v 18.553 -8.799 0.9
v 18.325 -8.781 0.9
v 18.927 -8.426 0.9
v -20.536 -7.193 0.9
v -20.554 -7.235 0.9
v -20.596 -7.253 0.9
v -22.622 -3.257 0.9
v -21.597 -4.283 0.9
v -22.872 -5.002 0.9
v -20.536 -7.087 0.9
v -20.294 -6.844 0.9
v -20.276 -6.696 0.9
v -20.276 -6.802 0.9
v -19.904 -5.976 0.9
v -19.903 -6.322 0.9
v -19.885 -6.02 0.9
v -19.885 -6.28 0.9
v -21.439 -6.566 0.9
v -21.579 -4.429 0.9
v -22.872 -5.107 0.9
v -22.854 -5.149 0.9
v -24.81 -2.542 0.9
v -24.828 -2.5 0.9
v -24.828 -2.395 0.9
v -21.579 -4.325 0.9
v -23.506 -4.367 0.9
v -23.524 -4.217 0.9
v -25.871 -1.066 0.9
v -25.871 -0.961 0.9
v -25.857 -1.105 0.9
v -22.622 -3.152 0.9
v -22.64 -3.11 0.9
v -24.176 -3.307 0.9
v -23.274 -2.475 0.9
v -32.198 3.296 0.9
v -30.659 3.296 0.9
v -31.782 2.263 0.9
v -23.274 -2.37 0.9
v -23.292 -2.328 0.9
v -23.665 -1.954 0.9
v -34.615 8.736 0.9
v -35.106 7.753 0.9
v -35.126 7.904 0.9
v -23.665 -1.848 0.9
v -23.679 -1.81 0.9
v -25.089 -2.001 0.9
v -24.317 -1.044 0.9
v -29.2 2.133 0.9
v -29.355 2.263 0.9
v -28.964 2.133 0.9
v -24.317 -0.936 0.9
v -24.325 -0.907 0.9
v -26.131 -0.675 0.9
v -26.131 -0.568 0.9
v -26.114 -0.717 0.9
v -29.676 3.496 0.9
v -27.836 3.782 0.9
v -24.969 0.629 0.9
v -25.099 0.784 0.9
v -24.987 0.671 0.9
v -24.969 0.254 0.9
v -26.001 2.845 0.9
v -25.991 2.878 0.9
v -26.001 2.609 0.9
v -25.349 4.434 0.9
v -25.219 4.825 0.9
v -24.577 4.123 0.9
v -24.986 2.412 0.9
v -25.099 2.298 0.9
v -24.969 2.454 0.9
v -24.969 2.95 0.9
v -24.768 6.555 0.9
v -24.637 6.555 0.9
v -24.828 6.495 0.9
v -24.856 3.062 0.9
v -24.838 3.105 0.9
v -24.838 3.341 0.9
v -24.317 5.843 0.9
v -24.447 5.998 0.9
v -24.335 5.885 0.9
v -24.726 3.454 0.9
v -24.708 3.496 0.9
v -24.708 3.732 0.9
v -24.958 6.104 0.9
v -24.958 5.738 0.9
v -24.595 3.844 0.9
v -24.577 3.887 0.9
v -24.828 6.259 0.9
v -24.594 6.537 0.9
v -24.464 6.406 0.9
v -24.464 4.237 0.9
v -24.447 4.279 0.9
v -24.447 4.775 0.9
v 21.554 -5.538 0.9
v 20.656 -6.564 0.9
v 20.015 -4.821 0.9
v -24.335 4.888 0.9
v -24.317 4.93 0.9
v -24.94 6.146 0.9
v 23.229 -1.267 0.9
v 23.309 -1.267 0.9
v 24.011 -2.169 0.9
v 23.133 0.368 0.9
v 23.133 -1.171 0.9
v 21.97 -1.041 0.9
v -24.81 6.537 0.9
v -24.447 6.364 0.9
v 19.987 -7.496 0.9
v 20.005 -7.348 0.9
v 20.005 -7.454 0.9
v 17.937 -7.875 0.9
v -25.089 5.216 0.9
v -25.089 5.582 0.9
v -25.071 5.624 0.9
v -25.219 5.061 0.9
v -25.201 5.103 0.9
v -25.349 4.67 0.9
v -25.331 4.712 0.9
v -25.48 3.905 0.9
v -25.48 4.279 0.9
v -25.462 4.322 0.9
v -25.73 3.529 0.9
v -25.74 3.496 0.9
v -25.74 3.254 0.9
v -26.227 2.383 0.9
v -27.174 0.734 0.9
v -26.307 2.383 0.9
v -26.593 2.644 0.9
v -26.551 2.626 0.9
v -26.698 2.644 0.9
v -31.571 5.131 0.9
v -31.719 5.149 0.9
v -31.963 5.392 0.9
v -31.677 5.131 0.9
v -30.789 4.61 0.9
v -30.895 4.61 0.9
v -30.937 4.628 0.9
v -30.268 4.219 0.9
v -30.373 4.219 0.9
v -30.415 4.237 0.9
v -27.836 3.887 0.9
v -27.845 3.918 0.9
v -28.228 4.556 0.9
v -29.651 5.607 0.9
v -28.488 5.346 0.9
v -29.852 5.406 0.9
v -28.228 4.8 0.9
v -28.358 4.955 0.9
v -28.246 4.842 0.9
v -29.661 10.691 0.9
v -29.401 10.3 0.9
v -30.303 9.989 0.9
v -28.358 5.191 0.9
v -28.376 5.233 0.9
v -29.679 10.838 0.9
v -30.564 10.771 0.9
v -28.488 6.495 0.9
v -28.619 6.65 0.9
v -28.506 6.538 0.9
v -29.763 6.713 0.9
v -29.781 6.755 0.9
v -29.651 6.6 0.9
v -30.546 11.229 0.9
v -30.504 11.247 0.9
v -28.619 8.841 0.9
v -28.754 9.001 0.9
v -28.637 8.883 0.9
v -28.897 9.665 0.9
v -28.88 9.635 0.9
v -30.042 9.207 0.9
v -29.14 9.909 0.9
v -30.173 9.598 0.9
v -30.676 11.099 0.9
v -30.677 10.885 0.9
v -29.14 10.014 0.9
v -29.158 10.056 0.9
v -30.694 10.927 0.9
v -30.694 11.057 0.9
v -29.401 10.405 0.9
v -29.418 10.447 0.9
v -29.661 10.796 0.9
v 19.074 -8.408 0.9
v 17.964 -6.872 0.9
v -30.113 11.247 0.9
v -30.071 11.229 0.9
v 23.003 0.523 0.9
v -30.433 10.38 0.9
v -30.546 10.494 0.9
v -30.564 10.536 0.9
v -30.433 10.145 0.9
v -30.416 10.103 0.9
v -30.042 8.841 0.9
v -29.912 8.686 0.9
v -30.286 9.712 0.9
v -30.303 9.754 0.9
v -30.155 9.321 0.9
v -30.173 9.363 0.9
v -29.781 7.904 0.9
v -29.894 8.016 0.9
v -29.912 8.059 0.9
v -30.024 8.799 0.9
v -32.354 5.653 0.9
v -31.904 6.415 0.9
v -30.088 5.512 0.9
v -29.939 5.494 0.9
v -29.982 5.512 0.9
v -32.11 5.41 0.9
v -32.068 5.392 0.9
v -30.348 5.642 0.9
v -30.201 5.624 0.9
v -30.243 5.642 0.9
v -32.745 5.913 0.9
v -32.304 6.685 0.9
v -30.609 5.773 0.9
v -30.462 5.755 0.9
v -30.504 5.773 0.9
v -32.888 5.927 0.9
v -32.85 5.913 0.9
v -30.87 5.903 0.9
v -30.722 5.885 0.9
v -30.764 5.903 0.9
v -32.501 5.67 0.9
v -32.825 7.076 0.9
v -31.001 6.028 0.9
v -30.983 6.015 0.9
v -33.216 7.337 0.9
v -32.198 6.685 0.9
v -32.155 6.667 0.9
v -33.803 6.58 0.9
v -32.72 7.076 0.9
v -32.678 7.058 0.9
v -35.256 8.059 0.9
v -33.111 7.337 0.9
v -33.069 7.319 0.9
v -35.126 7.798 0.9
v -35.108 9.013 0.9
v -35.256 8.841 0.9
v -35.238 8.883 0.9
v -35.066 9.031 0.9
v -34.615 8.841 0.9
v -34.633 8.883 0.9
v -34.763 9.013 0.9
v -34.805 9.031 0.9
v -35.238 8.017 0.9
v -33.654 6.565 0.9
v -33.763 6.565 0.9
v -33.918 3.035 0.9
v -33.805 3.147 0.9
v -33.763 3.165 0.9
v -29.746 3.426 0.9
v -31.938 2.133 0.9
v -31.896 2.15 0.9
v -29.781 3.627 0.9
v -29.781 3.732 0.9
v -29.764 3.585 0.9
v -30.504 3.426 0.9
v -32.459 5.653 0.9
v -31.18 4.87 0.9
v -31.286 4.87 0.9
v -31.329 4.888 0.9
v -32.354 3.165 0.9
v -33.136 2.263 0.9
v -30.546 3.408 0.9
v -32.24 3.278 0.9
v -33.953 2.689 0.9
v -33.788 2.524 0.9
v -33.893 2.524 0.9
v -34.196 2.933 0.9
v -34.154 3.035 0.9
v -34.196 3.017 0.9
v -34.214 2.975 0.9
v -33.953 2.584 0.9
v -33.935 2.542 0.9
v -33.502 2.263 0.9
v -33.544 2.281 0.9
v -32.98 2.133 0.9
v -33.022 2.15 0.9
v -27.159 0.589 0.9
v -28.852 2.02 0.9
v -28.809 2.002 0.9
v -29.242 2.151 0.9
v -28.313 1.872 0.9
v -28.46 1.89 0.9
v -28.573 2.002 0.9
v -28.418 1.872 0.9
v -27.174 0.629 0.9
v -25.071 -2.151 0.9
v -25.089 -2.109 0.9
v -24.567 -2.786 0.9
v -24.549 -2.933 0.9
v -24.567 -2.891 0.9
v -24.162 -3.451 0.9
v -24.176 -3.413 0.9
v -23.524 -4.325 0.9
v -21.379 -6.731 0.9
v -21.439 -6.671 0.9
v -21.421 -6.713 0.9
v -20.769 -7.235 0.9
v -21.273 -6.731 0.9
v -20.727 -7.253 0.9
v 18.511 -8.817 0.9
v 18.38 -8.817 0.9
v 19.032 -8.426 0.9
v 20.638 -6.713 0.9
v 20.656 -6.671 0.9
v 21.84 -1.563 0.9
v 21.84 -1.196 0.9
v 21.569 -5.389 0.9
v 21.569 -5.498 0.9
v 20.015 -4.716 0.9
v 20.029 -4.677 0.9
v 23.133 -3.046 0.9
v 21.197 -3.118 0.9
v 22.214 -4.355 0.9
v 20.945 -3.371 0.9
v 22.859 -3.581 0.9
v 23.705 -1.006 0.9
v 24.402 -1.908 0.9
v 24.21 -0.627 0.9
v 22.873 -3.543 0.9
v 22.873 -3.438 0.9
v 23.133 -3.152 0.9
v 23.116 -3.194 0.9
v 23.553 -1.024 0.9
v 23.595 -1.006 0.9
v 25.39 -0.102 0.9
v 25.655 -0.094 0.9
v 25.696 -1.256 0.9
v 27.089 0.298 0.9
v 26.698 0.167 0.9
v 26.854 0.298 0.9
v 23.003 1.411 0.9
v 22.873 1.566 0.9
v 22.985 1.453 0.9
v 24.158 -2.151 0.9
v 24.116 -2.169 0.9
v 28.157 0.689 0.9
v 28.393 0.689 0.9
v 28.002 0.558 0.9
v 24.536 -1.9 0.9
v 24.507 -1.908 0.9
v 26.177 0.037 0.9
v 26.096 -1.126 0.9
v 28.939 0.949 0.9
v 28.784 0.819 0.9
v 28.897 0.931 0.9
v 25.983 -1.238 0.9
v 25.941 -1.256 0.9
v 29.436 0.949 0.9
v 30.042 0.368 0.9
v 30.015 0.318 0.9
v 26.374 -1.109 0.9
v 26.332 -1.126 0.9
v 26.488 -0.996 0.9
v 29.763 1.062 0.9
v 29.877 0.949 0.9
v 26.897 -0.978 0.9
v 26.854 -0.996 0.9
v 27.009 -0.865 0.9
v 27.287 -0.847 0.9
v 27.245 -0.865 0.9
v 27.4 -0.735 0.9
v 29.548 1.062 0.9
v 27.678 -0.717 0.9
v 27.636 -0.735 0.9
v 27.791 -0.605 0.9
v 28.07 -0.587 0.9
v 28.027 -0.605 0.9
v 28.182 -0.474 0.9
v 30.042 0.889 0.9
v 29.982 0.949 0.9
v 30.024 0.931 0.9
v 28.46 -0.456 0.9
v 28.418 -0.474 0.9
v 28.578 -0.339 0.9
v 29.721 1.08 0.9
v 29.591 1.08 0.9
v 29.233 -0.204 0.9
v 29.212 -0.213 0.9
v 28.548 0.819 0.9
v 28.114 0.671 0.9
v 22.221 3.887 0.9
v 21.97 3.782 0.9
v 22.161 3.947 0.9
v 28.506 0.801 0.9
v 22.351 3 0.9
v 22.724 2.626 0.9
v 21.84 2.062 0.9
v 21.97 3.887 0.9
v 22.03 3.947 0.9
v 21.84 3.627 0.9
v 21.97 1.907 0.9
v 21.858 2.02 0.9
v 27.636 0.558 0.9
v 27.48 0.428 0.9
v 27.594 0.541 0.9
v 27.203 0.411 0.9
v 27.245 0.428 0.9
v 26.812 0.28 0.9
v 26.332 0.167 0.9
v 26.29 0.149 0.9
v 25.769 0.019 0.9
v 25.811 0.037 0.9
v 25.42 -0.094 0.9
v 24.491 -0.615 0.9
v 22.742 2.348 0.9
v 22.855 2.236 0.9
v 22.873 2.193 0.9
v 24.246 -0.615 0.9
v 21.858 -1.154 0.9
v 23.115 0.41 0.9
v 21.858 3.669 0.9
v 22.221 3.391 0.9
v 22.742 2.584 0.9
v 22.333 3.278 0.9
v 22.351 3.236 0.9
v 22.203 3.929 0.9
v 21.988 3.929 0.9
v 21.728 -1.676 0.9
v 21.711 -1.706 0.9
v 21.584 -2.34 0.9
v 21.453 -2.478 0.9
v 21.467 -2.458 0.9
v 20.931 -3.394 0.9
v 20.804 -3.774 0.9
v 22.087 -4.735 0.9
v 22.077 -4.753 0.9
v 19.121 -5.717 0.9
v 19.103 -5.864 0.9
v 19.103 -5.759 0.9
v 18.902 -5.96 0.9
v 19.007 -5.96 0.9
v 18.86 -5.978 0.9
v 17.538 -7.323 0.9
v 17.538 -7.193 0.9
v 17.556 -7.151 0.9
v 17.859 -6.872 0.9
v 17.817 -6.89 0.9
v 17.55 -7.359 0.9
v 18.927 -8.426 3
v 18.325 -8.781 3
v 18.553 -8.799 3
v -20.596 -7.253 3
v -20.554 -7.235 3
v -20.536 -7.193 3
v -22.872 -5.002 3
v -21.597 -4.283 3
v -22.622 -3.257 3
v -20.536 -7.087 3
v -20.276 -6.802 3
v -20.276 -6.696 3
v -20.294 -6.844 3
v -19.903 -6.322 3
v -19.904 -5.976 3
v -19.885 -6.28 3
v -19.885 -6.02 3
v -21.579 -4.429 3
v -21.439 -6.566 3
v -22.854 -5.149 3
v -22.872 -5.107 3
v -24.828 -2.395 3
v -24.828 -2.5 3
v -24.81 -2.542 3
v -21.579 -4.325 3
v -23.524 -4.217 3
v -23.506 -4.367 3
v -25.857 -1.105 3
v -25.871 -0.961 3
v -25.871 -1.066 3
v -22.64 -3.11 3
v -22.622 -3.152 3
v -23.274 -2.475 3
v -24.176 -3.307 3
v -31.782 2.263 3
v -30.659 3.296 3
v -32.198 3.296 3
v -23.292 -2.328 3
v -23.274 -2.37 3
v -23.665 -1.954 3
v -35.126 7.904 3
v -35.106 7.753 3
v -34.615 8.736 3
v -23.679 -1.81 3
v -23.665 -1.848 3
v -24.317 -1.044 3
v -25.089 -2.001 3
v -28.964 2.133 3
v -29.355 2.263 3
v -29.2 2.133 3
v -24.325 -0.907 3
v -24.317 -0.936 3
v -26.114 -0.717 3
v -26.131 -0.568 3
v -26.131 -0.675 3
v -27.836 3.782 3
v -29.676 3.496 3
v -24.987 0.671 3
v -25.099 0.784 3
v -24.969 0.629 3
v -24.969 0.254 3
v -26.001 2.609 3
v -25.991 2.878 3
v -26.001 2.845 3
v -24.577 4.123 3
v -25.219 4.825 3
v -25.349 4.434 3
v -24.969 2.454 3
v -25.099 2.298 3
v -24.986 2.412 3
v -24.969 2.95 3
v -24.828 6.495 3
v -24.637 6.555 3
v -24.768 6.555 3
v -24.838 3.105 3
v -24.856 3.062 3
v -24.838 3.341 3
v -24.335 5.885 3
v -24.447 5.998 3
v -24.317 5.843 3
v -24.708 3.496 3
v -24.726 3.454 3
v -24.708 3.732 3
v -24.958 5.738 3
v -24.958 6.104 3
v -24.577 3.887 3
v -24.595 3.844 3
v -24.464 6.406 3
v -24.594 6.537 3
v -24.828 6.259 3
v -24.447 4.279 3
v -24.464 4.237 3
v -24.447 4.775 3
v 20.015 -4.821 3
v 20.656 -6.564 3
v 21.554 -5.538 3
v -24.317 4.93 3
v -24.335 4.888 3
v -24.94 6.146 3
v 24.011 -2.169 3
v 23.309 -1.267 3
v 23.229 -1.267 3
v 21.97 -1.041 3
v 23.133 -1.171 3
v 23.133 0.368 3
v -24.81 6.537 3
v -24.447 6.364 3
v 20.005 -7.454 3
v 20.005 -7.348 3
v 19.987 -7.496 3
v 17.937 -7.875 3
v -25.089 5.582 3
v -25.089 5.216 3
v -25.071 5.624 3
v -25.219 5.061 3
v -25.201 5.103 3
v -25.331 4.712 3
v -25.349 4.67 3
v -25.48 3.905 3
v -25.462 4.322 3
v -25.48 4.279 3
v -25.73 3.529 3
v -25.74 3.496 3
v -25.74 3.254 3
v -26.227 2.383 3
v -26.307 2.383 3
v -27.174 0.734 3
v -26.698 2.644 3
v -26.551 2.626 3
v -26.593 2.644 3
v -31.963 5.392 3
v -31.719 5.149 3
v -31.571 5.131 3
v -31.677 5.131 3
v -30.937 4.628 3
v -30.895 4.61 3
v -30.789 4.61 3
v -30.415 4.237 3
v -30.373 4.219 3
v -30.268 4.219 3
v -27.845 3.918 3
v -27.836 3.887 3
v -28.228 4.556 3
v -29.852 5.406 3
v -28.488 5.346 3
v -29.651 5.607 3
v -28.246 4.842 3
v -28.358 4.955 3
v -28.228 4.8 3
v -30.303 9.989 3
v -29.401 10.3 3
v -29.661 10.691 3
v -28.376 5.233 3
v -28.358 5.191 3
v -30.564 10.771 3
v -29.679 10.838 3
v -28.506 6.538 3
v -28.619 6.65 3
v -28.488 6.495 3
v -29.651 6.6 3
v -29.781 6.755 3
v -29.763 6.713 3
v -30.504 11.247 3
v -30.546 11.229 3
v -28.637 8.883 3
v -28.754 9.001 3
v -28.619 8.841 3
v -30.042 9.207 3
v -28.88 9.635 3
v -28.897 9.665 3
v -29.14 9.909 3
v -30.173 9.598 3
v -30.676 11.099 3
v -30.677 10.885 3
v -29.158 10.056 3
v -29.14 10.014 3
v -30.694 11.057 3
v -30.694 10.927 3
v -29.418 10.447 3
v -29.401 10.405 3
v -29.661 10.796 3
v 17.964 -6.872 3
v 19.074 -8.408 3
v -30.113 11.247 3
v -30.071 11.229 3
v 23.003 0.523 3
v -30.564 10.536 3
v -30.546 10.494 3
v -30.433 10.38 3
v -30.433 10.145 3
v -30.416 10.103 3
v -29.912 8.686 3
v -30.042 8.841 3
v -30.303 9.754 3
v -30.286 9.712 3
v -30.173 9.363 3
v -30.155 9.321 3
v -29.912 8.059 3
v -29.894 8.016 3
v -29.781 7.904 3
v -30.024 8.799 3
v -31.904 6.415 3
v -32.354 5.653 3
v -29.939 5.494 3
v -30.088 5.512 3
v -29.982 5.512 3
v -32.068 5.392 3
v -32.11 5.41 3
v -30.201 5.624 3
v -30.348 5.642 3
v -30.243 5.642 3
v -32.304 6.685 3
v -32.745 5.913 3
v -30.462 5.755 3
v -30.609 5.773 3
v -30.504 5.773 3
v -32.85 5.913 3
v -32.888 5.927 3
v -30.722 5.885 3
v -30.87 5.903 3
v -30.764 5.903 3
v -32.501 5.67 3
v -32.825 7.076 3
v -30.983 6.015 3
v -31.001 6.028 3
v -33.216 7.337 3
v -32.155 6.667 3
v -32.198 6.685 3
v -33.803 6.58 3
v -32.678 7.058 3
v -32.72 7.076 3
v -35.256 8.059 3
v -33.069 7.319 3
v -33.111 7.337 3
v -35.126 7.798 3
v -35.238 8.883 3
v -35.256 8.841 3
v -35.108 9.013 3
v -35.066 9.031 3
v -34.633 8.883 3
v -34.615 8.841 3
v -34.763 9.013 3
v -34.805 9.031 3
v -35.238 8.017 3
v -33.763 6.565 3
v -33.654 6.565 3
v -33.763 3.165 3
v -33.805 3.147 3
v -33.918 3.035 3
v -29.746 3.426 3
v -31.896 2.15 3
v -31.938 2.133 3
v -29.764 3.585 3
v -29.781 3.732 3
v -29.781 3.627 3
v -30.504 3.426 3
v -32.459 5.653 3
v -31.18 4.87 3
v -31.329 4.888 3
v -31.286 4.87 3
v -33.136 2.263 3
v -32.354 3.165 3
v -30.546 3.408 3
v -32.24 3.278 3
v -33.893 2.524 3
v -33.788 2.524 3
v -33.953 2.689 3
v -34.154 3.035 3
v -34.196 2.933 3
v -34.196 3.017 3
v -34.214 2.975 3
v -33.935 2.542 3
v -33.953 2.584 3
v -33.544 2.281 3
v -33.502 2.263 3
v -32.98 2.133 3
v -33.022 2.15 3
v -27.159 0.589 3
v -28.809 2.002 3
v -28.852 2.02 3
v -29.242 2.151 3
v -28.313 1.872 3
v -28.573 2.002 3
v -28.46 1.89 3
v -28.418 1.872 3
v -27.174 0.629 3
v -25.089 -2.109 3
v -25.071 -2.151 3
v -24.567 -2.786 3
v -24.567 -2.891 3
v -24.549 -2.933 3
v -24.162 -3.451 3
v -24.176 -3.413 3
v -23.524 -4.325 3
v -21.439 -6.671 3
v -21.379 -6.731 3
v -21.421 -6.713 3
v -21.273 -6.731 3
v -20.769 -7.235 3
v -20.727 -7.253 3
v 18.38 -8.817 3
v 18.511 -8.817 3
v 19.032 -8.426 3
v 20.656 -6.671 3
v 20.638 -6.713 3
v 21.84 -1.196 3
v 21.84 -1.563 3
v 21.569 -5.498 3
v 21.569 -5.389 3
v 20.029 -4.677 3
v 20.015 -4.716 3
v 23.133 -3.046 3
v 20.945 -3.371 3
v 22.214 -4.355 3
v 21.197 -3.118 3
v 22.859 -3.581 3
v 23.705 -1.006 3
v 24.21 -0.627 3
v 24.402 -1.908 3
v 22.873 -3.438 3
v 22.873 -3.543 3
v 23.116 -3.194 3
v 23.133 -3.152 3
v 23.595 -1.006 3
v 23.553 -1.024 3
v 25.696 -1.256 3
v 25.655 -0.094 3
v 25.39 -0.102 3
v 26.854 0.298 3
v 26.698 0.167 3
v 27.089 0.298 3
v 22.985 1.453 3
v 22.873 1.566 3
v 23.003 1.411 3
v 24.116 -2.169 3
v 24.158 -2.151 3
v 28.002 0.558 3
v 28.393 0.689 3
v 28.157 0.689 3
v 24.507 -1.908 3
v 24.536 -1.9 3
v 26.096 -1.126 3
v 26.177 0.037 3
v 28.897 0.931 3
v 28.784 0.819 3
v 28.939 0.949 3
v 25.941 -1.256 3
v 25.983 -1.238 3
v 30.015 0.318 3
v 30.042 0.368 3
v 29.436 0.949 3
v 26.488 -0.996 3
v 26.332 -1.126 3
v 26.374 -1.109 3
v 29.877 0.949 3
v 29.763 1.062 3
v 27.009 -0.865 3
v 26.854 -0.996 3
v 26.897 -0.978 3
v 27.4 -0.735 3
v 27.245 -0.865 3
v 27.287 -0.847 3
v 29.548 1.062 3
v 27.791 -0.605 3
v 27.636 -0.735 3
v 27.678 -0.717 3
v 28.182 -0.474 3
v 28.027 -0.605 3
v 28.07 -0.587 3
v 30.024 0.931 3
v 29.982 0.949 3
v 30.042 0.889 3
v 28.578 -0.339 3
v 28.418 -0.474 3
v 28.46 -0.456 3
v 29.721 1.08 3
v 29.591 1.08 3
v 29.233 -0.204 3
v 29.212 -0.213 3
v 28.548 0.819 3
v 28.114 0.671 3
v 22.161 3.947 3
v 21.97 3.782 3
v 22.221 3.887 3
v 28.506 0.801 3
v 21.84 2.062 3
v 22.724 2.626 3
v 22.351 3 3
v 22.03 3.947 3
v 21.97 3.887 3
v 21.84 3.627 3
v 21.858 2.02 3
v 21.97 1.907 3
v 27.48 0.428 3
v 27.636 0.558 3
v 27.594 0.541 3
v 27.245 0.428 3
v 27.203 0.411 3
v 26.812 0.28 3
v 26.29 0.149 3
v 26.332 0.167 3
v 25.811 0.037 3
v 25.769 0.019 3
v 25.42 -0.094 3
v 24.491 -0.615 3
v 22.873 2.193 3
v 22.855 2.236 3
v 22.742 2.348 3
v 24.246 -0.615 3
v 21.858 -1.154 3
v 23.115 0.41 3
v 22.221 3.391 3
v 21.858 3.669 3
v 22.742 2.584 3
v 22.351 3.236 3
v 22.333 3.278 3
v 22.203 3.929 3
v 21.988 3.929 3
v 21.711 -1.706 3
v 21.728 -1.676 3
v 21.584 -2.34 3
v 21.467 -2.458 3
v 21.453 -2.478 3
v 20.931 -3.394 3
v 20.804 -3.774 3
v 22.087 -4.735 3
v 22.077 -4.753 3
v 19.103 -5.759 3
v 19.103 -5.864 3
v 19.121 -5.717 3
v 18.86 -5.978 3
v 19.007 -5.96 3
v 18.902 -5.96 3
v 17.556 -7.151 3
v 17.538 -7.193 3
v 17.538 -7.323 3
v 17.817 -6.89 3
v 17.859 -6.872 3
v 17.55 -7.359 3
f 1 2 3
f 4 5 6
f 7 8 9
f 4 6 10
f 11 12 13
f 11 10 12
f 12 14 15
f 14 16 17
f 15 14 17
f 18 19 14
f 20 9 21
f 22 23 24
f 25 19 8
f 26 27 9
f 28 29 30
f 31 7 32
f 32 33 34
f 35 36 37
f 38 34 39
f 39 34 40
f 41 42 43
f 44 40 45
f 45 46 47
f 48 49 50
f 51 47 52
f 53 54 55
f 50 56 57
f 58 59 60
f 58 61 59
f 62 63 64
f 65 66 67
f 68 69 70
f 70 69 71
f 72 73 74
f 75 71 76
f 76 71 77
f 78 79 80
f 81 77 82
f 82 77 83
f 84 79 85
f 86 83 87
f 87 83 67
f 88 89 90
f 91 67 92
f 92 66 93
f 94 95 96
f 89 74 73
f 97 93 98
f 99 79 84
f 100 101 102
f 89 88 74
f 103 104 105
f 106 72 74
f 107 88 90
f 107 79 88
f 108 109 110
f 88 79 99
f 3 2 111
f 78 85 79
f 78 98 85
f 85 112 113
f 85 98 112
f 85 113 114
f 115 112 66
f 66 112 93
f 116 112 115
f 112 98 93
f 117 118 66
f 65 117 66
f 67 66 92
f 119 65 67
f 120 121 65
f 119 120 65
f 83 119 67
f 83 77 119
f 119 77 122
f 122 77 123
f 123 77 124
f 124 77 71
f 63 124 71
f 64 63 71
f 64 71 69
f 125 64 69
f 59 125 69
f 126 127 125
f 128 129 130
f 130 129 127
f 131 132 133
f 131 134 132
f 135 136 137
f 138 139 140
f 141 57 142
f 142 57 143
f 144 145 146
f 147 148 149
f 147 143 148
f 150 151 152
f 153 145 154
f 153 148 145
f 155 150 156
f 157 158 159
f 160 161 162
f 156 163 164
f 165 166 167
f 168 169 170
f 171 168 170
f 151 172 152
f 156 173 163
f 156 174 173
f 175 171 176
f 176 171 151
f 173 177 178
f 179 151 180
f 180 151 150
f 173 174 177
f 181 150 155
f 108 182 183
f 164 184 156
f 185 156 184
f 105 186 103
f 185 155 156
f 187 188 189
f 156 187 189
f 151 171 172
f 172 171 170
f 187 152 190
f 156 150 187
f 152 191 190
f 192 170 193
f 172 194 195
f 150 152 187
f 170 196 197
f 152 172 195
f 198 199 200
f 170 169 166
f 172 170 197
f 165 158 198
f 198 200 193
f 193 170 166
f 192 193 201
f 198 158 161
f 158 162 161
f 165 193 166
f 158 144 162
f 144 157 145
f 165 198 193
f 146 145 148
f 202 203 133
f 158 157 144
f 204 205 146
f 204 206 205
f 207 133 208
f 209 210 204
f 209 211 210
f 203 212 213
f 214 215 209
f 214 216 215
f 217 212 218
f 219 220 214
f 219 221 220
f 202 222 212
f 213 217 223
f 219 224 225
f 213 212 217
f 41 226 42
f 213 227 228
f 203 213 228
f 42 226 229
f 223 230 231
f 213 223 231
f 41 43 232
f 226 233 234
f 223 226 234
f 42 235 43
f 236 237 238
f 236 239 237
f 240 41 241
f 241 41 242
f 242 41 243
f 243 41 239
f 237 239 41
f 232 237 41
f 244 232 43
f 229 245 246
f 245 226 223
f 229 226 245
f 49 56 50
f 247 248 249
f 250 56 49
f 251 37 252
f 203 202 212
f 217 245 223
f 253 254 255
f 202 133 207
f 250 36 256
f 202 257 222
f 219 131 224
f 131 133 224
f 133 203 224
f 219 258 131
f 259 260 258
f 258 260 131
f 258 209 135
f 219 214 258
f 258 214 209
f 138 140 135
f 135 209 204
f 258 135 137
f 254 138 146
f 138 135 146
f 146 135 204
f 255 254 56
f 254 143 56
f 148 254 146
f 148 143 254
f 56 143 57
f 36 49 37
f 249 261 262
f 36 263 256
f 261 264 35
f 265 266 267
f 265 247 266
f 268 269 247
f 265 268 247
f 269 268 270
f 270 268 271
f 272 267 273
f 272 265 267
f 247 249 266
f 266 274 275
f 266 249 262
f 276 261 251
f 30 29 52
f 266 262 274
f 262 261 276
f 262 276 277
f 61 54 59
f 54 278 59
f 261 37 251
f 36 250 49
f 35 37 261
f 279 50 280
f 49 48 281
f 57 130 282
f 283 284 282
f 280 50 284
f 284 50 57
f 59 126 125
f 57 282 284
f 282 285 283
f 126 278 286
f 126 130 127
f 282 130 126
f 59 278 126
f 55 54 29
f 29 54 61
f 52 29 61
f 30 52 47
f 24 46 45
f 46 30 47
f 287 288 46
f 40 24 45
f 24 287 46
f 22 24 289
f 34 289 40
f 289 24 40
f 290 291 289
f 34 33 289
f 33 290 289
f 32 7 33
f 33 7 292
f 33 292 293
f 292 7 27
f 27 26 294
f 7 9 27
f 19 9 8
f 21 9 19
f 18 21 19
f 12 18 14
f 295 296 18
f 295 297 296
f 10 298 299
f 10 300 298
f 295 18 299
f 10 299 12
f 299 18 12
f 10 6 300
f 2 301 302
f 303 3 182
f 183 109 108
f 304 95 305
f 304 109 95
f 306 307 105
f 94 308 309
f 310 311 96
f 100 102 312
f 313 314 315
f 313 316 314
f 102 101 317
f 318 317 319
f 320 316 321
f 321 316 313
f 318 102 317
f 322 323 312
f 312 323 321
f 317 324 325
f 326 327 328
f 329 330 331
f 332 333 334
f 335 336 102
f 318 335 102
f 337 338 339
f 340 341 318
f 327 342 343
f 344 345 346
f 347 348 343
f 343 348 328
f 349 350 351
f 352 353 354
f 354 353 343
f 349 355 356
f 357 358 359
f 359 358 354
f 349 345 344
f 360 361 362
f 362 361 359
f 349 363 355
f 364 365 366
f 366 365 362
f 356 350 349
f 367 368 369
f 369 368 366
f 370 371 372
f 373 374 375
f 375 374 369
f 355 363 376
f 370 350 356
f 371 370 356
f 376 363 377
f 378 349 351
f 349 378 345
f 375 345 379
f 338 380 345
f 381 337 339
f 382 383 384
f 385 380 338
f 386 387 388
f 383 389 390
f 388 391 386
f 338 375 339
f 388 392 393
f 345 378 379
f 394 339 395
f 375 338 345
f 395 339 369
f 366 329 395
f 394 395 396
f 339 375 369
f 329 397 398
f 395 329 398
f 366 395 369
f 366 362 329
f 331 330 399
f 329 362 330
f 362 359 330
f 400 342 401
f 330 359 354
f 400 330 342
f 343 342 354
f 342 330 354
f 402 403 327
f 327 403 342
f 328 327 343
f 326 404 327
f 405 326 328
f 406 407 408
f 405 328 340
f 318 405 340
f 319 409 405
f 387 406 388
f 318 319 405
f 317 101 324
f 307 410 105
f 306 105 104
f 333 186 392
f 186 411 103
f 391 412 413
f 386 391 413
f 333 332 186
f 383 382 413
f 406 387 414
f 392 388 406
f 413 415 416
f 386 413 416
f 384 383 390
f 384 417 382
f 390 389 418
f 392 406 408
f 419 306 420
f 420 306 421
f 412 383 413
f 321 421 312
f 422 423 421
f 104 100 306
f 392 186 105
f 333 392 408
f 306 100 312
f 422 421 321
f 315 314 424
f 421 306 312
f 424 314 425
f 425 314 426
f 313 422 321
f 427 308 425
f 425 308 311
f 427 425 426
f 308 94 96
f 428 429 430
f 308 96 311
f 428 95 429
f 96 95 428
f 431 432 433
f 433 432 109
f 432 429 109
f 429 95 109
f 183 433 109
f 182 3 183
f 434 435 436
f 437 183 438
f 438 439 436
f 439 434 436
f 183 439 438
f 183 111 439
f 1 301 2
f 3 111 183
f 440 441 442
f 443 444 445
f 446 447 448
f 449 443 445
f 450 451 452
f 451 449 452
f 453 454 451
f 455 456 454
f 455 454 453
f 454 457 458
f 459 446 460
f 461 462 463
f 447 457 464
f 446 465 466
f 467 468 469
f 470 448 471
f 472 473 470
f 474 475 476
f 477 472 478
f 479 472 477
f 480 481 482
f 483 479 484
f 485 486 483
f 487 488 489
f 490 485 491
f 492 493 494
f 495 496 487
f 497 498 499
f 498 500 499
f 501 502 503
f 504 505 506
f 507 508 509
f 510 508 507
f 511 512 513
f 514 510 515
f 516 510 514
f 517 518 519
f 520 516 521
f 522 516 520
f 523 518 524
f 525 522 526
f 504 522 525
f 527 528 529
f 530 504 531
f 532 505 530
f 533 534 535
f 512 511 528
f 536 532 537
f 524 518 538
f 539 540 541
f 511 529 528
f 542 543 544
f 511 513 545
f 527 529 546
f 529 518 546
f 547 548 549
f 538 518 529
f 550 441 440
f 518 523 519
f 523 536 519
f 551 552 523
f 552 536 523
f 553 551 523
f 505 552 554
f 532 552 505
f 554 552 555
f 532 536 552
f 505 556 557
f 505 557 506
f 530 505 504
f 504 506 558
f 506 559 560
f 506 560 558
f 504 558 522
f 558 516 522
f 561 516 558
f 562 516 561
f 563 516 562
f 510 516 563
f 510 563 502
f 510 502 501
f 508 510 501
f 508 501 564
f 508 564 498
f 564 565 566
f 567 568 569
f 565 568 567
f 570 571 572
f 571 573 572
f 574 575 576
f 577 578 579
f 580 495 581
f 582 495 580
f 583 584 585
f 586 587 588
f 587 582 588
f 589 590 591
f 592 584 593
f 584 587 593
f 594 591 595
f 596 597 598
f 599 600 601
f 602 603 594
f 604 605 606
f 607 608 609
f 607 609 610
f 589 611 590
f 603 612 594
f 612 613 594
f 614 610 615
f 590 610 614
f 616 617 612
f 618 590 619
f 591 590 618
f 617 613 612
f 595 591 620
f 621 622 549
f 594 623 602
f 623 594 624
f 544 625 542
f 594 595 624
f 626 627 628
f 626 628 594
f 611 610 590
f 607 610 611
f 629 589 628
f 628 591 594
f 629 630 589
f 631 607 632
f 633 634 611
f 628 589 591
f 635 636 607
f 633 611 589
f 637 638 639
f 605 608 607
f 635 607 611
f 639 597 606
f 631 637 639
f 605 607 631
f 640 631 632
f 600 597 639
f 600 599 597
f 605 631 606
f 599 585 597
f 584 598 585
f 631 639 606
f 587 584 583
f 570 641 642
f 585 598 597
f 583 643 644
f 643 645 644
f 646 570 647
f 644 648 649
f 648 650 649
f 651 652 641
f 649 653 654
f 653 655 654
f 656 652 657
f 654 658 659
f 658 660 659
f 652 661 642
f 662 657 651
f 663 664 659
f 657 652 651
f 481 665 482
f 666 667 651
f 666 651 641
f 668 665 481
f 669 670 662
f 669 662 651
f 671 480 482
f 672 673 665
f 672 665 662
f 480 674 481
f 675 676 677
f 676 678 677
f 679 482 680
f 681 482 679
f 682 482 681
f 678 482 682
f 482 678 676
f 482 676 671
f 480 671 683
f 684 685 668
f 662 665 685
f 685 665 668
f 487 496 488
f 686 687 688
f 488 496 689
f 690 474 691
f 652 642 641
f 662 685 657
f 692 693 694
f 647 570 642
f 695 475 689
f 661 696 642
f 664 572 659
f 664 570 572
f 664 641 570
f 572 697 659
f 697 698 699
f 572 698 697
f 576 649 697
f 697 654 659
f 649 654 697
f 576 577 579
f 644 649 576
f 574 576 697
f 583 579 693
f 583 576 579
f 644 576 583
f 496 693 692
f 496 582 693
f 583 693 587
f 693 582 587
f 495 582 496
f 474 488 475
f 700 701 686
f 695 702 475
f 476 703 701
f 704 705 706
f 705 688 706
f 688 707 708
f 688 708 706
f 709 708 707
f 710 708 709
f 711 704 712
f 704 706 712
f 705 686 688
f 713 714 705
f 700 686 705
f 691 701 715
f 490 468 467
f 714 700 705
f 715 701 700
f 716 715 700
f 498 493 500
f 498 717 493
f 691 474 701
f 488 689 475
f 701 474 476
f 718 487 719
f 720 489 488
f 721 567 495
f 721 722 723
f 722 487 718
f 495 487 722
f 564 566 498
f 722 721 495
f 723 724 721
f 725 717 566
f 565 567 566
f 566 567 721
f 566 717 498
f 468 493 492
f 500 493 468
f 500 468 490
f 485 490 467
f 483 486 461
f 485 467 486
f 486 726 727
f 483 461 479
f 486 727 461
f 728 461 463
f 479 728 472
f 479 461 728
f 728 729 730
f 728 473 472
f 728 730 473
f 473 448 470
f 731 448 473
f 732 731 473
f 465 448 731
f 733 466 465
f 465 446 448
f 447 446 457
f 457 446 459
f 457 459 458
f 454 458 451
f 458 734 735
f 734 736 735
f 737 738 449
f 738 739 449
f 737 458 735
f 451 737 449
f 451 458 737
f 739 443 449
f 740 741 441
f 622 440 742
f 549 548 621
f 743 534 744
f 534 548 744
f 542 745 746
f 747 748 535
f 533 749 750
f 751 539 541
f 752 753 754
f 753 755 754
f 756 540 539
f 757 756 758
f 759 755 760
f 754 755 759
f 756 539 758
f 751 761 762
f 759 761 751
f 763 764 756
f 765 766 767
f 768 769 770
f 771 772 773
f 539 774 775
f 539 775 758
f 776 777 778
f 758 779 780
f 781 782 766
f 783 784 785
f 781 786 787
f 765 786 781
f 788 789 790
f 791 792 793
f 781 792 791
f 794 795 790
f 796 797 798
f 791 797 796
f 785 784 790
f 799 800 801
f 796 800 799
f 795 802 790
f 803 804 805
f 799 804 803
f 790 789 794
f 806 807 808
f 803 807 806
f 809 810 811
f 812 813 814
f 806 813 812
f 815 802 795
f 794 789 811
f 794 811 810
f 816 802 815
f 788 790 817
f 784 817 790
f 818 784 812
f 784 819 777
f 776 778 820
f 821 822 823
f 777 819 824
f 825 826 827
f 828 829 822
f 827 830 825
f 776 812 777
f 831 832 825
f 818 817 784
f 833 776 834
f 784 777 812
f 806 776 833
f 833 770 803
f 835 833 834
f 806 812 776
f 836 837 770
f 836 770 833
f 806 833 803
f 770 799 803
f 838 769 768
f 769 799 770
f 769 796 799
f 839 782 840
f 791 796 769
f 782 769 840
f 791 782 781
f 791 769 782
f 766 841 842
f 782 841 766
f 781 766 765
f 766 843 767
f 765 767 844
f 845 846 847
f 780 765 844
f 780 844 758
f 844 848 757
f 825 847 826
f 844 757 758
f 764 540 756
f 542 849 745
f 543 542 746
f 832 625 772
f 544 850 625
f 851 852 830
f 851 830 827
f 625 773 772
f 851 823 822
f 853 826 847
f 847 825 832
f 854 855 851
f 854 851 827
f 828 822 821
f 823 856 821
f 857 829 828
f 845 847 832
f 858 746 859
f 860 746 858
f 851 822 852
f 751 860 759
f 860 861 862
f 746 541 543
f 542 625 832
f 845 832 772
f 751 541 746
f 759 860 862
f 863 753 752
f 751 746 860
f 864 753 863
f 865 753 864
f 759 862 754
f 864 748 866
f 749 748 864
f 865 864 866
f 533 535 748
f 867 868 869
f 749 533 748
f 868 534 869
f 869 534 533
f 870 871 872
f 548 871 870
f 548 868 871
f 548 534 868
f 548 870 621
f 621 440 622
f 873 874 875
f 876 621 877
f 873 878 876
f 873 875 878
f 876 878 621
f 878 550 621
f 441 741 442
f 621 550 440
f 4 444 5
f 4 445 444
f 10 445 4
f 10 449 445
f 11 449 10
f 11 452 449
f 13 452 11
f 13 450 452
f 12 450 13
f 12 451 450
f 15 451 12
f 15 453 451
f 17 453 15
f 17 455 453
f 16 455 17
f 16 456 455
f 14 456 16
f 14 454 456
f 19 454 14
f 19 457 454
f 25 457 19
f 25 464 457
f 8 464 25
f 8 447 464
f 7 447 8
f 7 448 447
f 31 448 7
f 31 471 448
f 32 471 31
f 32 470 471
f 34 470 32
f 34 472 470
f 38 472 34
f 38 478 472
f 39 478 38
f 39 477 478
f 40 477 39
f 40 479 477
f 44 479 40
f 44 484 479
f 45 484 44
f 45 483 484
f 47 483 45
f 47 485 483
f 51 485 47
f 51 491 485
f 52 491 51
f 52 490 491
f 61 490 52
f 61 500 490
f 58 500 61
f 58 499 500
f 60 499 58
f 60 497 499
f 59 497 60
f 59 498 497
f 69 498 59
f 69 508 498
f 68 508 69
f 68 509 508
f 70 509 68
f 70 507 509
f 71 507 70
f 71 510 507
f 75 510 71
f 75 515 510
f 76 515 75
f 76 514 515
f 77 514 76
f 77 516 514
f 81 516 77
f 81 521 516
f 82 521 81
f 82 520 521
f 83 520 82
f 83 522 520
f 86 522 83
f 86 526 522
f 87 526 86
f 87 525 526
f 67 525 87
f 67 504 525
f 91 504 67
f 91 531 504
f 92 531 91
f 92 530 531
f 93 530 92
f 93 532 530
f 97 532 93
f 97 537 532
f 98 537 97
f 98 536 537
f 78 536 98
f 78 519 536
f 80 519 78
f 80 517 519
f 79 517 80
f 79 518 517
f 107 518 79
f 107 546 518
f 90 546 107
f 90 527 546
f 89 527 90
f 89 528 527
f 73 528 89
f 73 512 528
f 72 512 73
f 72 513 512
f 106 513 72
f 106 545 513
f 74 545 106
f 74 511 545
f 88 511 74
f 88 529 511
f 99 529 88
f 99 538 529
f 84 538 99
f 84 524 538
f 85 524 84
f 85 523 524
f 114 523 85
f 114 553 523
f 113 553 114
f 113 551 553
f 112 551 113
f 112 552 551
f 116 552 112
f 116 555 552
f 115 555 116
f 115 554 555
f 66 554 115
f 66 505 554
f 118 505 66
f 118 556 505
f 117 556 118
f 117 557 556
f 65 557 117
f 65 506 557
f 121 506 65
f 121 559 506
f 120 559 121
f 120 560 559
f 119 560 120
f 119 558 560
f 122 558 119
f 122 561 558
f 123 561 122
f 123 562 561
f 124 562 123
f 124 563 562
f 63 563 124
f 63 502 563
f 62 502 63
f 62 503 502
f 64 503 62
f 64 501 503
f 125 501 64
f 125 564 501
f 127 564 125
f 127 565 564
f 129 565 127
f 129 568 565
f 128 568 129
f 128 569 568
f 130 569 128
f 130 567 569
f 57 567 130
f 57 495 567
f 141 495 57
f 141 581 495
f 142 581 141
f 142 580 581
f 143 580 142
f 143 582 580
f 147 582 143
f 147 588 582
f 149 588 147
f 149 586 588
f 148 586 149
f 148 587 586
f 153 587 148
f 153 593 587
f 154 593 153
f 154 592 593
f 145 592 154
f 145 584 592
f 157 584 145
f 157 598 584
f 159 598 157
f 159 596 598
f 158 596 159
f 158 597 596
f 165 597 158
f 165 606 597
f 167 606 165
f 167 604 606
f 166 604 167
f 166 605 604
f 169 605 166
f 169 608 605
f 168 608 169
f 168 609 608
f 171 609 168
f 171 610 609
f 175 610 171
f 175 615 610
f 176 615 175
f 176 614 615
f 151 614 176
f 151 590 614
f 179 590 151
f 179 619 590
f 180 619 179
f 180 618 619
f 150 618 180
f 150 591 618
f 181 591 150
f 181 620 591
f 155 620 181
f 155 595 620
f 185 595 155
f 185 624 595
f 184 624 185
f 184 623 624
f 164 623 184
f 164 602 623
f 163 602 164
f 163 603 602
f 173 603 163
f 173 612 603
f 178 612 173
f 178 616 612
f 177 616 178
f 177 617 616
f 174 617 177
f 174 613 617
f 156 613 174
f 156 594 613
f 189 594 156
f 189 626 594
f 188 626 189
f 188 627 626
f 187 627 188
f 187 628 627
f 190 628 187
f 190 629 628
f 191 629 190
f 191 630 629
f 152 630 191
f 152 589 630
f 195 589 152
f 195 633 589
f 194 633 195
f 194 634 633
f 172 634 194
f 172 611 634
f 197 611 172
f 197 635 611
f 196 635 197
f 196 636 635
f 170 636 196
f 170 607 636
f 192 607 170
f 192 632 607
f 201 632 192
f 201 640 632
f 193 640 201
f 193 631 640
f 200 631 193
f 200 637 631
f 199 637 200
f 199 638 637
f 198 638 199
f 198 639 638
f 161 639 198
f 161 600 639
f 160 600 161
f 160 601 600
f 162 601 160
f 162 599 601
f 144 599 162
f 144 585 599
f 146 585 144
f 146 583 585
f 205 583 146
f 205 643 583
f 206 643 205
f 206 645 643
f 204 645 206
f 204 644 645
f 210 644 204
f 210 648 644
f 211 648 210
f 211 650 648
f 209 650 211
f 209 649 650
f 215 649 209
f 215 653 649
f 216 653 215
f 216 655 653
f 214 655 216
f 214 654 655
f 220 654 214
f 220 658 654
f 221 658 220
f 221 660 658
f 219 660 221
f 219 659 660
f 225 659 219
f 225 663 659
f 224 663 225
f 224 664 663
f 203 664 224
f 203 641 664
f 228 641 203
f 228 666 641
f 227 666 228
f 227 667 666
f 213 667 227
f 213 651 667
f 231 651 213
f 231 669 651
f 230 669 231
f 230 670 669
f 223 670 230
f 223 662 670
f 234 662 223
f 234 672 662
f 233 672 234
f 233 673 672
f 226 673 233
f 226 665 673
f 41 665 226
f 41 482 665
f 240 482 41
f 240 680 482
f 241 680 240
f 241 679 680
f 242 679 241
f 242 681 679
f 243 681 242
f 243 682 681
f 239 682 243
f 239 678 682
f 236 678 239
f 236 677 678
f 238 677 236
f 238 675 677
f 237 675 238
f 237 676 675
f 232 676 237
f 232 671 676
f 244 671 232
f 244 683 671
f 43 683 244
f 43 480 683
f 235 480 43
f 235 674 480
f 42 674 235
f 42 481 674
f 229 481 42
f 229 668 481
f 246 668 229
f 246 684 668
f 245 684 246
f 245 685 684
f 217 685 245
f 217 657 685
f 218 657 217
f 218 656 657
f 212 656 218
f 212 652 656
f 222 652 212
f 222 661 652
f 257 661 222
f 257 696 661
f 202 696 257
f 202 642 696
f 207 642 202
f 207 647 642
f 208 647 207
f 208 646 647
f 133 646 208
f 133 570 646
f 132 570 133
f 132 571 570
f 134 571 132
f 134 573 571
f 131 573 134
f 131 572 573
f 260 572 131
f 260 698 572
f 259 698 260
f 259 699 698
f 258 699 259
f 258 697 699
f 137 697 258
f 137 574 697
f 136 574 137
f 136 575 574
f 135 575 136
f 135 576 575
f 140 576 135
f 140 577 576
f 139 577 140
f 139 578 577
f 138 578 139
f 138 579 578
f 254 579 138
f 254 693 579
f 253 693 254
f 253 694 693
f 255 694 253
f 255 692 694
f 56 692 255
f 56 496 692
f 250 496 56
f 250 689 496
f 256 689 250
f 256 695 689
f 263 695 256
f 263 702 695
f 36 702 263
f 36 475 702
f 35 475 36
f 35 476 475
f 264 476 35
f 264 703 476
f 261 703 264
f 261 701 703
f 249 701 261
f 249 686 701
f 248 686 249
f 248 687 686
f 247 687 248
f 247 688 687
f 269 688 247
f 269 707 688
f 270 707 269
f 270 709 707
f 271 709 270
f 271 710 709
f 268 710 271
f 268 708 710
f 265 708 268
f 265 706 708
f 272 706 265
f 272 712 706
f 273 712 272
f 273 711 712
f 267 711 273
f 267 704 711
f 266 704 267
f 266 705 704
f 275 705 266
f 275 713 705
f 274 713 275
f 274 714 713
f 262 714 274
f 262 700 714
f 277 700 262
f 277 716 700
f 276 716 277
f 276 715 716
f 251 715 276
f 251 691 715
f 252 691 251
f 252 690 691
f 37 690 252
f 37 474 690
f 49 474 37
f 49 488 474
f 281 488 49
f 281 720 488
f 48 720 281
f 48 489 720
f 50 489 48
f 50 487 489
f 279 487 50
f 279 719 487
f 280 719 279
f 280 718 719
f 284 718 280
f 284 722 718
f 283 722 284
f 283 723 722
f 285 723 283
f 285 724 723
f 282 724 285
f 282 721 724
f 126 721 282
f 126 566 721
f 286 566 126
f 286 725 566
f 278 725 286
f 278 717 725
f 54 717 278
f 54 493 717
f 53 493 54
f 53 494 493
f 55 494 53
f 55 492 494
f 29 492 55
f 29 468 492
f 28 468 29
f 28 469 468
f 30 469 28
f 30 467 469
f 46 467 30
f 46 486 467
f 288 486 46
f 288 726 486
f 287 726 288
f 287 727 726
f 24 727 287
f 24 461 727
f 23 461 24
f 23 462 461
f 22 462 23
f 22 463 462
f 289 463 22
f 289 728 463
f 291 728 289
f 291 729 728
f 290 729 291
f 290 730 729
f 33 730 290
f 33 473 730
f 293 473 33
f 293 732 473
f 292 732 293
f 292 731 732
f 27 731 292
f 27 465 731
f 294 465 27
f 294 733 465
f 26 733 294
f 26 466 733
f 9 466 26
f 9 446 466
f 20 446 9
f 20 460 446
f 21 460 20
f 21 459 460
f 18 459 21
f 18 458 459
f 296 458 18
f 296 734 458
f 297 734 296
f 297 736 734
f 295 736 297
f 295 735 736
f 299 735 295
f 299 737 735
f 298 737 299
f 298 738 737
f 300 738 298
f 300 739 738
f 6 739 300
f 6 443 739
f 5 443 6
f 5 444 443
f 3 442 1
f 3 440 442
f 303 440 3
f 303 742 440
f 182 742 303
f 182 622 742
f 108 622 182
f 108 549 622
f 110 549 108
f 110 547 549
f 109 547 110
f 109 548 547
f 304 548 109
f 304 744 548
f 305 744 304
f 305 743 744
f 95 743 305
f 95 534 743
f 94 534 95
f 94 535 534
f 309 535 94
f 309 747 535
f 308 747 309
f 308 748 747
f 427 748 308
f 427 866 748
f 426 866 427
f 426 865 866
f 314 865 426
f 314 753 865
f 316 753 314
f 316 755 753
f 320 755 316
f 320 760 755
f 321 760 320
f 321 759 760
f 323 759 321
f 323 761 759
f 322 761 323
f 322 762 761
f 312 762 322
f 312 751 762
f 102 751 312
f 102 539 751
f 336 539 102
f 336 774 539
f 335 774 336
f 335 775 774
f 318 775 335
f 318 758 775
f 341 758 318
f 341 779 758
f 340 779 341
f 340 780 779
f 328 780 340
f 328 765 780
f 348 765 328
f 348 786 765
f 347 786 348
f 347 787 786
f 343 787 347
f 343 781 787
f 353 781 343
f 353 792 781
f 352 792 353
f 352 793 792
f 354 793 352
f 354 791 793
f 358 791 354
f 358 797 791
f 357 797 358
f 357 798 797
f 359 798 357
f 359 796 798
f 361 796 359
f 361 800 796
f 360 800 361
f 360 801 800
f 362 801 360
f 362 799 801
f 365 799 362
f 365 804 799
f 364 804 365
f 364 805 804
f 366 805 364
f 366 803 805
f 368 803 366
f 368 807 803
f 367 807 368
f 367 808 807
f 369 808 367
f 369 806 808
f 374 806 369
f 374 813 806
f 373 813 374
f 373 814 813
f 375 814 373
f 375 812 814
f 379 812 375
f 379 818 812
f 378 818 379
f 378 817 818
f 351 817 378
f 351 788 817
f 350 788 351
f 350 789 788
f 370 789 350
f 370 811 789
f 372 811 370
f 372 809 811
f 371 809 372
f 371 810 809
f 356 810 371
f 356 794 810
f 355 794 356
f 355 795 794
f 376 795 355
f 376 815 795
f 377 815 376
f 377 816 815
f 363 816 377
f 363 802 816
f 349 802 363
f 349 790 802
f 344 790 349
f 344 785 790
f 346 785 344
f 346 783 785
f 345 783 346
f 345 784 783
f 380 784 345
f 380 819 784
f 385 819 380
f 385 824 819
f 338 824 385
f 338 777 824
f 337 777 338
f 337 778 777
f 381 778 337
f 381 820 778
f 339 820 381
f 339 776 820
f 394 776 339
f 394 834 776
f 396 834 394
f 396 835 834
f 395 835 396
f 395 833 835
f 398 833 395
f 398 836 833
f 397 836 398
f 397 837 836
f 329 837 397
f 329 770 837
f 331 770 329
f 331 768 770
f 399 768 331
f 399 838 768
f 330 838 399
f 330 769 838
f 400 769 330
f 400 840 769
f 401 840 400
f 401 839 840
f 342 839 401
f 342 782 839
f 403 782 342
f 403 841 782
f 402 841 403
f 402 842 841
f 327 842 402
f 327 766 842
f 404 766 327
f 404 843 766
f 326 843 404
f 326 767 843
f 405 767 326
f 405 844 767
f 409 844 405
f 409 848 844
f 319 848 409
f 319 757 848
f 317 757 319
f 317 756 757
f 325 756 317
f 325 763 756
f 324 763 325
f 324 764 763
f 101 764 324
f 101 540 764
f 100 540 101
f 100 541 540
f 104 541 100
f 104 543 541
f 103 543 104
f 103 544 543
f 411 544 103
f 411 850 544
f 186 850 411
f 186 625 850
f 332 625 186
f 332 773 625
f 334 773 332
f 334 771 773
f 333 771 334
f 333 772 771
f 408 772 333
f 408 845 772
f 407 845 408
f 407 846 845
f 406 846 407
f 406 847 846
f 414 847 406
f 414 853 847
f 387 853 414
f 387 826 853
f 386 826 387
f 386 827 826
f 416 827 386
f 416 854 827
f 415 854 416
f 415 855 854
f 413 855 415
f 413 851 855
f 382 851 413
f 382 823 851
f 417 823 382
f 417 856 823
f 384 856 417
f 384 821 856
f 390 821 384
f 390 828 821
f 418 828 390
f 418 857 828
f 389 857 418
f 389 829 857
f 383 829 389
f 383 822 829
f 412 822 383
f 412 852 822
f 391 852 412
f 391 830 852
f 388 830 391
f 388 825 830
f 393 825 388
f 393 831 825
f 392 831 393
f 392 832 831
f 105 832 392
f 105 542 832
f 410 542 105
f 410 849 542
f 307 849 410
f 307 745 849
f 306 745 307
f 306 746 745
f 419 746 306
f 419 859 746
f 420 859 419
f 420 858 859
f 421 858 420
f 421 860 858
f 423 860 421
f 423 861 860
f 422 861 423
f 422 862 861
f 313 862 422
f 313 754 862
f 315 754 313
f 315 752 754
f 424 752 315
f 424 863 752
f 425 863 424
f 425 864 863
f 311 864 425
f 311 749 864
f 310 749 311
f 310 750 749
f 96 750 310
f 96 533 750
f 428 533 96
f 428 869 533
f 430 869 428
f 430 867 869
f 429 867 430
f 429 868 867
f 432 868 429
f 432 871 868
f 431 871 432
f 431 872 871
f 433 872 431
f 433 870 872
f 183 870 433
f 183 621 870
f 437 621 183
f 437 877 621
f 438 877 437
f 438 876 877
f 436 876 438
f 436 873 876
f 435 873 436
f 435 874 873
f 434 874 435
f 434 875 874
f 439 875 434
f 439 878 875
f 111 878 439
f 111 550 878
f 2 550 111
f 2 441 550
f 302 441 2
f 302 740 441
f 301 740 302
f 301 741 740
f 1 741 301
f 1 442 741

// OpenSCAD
$fn = 24;
translate([0, -2.500, 0.900])
  linear_extrude(height=2.100) {
offset(r=0.06, $fn=8) {
    polygon(points=[[29.982,3.389],[29.852,3.389],[29.721,3.520],[29.591,3.520],[29.461,3.389],[28.939,3.389],[28.809,3.259],[28.548,3.259],[28.418,3.129],[28.157,3.129],[28.027,2.998],[27.636,2.998],[27.505,2.868],[27.245,2.868],[27.114,2.738],[26.854,2.738],[26.723,2.607],[26.332,2.607],[26.202,2.477],[25.811,2.477],[25.680,2.346],[25.420,2.346],[24.507,1.825],[24.246,1.825],[23.725,1.434],[23.595,1.434],[23.334,1.173],[23.204,1.173],[23.073,1.304],[23.073,2.868],[22.943,2.998],[22.943,3.911],[22.813,4.041],[22.813,4.693],[22.682,4.823],[22.682,5.084],[22.291,5.475],[22.291,5.736],[22.161,5.866],[22.161,6.387],[22.030,6.387],[22.030,6.257],[21.900,6.127],[21.900,4.562],[22.030,4.432],[22.030,1.434],[21.900,1.304],[21.900,0.912],[21.770,0.782],[21.639,0.130],[21.509,0.000],[21.248,-0.652],[20.988,-0.913],[20.857,-1.304],[20.075,-2.216],[20.075,-2.346],[19.163,-3.259],[19.163,-3.389],[19.032,-3.520],[18.902,-3.520],[17.989,-4.432],[17.859,-4.432],[17.598,-4.693],[17.598,-4.823],[17.989,-5.345],[18.380,-6.257],[18.511,-6.257],[18.902,-5.866],[19.032,-5.866],[19.945,-4.954],[19.945,-4.823],[20.596,-4.171],[20.596,-4.041],[21.509,-2.998],[21.509,-2.868],[22.030,-2.216],[22.161,-1.825],[22.813,-1.043],[22.813,-0.913],[23.073,-0.652],[23.073,-0.521],[23.986,0.391],[24.116,0.391],[24.377,0.652],[24.507,0.652],[25.680,1.304],[25.941,1.304],[26.071,1.434],[26.332,1.434],[26.463,1.564],[26.854,1.564],[26.984,1.695],[27.245,1.695],[27.375,1.825],[27.636,1.825],[27.766,1.955],[28.027,1.955],[28.157,2.086],[28.418,2.086],[28.548,2.216],[29.200,2.346],[29.982,2.868]], paths=[[0,1,2,3,4,5,6,7,8,9,10,11,12,13,14,15,16,17,18,19,20,21,22,23,24,25,26,27,28,29,30,31,32,33,34,35,36,37,38,39,40,41,42,43,44,45,46,47,48,49,50,51,52,53,54,55,56,57,58,59,60,61,62,63,64,65,66,67,68,69,70,71,72,73,74,75,76,77,78,79,80,81,82,83,84,85,86,87,88,89,90,91,92,93,94,95,96,97,98,99,100,101]]);
    polygon(points=[[-35.066,11.471],[-35.196,11.341],[-35.196,10.559],[-35.066,10.429],[-35.066,10.298],[-33.763,9.125],[-33.632,9.125],[-32.850,8.473],[-32.720,8.473],[-32.459,8.213],[-32.329,8.213],[-32.068,7.952],[-31.938,7.952],[-31.677,7.691],[-31.546,7.691],[-31.286,7.430],[-31.155,7.430],[-30.895,7.170],[-30.764,7.170],[-30.373,6.779],[-30.243,6.779],[-29.721,6.257],[-29.721,6.127],[-29.591,5.996],[-29.721,5.866],[-30.504,5.866],[-30.634,5.736],[-32.198,5.736],[-32.329,5.605],[-33.763,5.605],[-33.893,5.475],[-34.154,5.475],[-33.893,5.214],[-33.893,5.084],[-33.763,5.084],[-33.502,4.823],[-33.111,4.823],[-32.980,4.693],[-31.938,4.693],[-31.807,4.823],[-29.330,4.823],[-29.200,4.693],[-28.939,4.693],[-28.809,4.562],[-28.548,4.562],[-28.418,4.432],[-28.288,4.432],[-27.114,3.259],[-27.114,3.129],[-26.071,1.955],[-26.071,1.825],[-25.811,1.564],[-25.811,1.434],[-25.029,0.521],[-25.029,0.391],[-24.768,0.130],[-24.768,0.000],[-24.507,-0.261],[-24.507,-0.391],[-24.116,-0.782],[-24.116,-0.913],[-23.464,-1.695],[-23.464,-1.825],[-22.812,-2.477],[-22.812,-2.607],[-21.379,-4.041],[-21.379,-4.171],[-21.248,-4.171],[-20.727,-4.693],[-20.596,-4.693],[-20.596,-4.562],[-20.336,-4.302],[-20.336,-4.171],[-19.945,-3.780],[-19.945,-3.520],[-21.639,-1.955],[-21.639,-1.825],[-22.682,-0.782],[-22.682,-0.652],[-23.334,0.000],[-23.334,0.130],[-23.725,0.521],[-23.725,0.652],[-24.377,1.434],[-24.377,1.564],[-25.029,2.738],[-25.029,3.129],[-25.159,3.259],[-25.159,4.823],[-25.029,4.954],[-25.029,5.475],[-24.898,5.605],[-24.898,5.866],[-24.768,5.996],[-24.768,6.257],[-24.637,6.387],[-24.637,6.648],[-24.507,6.779],[-24.507,7.300],[-24.377,7.430],[-24.377,8.343],[-24.507,8.473],[-24.507,8.864],[-24.637,8.995],[-24.768,8.995],[-24.768,8.734],[-24.898,8.604],[-24.898,8.213],[-25.029,8.082],[-25.029,7.691],[-25.159,7.561],[-25.159,7.300],[-25.289,7.170],[-25.289,6.909],[-25.420,6.779],[-25.420,6.387],[-25.680,5.996],[-25.680,5.736],[-25.941,5.345],[-25.941,5.084],[-26.202,4.823],[-26.332,4.823],[-26.593,5.084],[-26.723,5.084],[-27.896,6.257],[-27.896,6.387],[-28.288,7.039],[-28.288,7.300],[-28.418,7.430],[-28.418,7.691],[-28.548,7.821],[-28.548,8.995],[-28.679,9.125],[-28.679,11.341],[-28.809,11.471],[-28.939,12.123],[-29.200,12.384],[-29.200,12.514],[-29.461,12.775],[-29.461,12.905],[-29.721,13.166],[-29.721,13.296],[-30.113,13.687],[-30.504,13.687],[-30.634,13.557],[-30.634,13.427],[-30.504,13.296],[-30.504,13.036],[-30.373,12.905],[-30.373,12.645],[-30.243,12.514],[-30.243,12.254],[-30.113,12.123],[-30.113,11.863],[-29.982,11.732],[-29.982,11.341],[-29.852,11.211],[-29.852,10.559],[-29.721,10.429],[-29.721,9.255],[-29.591,9.125],[-29.591,8.082],[-29.852,7.821],[-29.982,7.952],[-30.113,7.952],[-30.243,8.082],[-30.373,8.082],[-30.504,8.213],[-30.634,8.213],[-30.764,8.343],[-30.895,8.343],[-31.025,8.473],[-31.938,8.864],[-32.198,9.125],[-32.329,9.125],[-32.720,9.516],[-32.850,9.516],[-33.111,9.777],[-33.241,9.777],[-34.675,11.211],[-34.675,11.341],[-34.805,11.471]], paths=[[0,1,2,3,4,5,6,7,8,9,10,11,12,13,14,15,16,17,18,19,20,21,22,23,24,25,26,27,28,29,30,31,32,33,34,35,36,37,38,39,40,41,42,43,44,45,46,47,48,49,50,51,52,53,54,55,56,57,58,59,60,61,62,63,64,65,66,67,68,69,70,71,72,73,74,75,76,77,78,79,80,81,82,83,84,85,86,87,88,89,90,91,92,93,94,95,96,97,98,99,100,101,102,103,104,105,106,107,108,109,110,111,112,113,114,115,116,117,118,119,120,121,122,123,124,125,126,127,128,129,130,131,132,133,134,135,136,137,138,139,140,141,142,143,144,145,146,147,148,149,150,151,152,153,154,155,156,157,158,159,160,161,162,163,164,165,166,167,168,169,170,171,172,173,174,175,176,177,178,179,180,181]]);
}
}
